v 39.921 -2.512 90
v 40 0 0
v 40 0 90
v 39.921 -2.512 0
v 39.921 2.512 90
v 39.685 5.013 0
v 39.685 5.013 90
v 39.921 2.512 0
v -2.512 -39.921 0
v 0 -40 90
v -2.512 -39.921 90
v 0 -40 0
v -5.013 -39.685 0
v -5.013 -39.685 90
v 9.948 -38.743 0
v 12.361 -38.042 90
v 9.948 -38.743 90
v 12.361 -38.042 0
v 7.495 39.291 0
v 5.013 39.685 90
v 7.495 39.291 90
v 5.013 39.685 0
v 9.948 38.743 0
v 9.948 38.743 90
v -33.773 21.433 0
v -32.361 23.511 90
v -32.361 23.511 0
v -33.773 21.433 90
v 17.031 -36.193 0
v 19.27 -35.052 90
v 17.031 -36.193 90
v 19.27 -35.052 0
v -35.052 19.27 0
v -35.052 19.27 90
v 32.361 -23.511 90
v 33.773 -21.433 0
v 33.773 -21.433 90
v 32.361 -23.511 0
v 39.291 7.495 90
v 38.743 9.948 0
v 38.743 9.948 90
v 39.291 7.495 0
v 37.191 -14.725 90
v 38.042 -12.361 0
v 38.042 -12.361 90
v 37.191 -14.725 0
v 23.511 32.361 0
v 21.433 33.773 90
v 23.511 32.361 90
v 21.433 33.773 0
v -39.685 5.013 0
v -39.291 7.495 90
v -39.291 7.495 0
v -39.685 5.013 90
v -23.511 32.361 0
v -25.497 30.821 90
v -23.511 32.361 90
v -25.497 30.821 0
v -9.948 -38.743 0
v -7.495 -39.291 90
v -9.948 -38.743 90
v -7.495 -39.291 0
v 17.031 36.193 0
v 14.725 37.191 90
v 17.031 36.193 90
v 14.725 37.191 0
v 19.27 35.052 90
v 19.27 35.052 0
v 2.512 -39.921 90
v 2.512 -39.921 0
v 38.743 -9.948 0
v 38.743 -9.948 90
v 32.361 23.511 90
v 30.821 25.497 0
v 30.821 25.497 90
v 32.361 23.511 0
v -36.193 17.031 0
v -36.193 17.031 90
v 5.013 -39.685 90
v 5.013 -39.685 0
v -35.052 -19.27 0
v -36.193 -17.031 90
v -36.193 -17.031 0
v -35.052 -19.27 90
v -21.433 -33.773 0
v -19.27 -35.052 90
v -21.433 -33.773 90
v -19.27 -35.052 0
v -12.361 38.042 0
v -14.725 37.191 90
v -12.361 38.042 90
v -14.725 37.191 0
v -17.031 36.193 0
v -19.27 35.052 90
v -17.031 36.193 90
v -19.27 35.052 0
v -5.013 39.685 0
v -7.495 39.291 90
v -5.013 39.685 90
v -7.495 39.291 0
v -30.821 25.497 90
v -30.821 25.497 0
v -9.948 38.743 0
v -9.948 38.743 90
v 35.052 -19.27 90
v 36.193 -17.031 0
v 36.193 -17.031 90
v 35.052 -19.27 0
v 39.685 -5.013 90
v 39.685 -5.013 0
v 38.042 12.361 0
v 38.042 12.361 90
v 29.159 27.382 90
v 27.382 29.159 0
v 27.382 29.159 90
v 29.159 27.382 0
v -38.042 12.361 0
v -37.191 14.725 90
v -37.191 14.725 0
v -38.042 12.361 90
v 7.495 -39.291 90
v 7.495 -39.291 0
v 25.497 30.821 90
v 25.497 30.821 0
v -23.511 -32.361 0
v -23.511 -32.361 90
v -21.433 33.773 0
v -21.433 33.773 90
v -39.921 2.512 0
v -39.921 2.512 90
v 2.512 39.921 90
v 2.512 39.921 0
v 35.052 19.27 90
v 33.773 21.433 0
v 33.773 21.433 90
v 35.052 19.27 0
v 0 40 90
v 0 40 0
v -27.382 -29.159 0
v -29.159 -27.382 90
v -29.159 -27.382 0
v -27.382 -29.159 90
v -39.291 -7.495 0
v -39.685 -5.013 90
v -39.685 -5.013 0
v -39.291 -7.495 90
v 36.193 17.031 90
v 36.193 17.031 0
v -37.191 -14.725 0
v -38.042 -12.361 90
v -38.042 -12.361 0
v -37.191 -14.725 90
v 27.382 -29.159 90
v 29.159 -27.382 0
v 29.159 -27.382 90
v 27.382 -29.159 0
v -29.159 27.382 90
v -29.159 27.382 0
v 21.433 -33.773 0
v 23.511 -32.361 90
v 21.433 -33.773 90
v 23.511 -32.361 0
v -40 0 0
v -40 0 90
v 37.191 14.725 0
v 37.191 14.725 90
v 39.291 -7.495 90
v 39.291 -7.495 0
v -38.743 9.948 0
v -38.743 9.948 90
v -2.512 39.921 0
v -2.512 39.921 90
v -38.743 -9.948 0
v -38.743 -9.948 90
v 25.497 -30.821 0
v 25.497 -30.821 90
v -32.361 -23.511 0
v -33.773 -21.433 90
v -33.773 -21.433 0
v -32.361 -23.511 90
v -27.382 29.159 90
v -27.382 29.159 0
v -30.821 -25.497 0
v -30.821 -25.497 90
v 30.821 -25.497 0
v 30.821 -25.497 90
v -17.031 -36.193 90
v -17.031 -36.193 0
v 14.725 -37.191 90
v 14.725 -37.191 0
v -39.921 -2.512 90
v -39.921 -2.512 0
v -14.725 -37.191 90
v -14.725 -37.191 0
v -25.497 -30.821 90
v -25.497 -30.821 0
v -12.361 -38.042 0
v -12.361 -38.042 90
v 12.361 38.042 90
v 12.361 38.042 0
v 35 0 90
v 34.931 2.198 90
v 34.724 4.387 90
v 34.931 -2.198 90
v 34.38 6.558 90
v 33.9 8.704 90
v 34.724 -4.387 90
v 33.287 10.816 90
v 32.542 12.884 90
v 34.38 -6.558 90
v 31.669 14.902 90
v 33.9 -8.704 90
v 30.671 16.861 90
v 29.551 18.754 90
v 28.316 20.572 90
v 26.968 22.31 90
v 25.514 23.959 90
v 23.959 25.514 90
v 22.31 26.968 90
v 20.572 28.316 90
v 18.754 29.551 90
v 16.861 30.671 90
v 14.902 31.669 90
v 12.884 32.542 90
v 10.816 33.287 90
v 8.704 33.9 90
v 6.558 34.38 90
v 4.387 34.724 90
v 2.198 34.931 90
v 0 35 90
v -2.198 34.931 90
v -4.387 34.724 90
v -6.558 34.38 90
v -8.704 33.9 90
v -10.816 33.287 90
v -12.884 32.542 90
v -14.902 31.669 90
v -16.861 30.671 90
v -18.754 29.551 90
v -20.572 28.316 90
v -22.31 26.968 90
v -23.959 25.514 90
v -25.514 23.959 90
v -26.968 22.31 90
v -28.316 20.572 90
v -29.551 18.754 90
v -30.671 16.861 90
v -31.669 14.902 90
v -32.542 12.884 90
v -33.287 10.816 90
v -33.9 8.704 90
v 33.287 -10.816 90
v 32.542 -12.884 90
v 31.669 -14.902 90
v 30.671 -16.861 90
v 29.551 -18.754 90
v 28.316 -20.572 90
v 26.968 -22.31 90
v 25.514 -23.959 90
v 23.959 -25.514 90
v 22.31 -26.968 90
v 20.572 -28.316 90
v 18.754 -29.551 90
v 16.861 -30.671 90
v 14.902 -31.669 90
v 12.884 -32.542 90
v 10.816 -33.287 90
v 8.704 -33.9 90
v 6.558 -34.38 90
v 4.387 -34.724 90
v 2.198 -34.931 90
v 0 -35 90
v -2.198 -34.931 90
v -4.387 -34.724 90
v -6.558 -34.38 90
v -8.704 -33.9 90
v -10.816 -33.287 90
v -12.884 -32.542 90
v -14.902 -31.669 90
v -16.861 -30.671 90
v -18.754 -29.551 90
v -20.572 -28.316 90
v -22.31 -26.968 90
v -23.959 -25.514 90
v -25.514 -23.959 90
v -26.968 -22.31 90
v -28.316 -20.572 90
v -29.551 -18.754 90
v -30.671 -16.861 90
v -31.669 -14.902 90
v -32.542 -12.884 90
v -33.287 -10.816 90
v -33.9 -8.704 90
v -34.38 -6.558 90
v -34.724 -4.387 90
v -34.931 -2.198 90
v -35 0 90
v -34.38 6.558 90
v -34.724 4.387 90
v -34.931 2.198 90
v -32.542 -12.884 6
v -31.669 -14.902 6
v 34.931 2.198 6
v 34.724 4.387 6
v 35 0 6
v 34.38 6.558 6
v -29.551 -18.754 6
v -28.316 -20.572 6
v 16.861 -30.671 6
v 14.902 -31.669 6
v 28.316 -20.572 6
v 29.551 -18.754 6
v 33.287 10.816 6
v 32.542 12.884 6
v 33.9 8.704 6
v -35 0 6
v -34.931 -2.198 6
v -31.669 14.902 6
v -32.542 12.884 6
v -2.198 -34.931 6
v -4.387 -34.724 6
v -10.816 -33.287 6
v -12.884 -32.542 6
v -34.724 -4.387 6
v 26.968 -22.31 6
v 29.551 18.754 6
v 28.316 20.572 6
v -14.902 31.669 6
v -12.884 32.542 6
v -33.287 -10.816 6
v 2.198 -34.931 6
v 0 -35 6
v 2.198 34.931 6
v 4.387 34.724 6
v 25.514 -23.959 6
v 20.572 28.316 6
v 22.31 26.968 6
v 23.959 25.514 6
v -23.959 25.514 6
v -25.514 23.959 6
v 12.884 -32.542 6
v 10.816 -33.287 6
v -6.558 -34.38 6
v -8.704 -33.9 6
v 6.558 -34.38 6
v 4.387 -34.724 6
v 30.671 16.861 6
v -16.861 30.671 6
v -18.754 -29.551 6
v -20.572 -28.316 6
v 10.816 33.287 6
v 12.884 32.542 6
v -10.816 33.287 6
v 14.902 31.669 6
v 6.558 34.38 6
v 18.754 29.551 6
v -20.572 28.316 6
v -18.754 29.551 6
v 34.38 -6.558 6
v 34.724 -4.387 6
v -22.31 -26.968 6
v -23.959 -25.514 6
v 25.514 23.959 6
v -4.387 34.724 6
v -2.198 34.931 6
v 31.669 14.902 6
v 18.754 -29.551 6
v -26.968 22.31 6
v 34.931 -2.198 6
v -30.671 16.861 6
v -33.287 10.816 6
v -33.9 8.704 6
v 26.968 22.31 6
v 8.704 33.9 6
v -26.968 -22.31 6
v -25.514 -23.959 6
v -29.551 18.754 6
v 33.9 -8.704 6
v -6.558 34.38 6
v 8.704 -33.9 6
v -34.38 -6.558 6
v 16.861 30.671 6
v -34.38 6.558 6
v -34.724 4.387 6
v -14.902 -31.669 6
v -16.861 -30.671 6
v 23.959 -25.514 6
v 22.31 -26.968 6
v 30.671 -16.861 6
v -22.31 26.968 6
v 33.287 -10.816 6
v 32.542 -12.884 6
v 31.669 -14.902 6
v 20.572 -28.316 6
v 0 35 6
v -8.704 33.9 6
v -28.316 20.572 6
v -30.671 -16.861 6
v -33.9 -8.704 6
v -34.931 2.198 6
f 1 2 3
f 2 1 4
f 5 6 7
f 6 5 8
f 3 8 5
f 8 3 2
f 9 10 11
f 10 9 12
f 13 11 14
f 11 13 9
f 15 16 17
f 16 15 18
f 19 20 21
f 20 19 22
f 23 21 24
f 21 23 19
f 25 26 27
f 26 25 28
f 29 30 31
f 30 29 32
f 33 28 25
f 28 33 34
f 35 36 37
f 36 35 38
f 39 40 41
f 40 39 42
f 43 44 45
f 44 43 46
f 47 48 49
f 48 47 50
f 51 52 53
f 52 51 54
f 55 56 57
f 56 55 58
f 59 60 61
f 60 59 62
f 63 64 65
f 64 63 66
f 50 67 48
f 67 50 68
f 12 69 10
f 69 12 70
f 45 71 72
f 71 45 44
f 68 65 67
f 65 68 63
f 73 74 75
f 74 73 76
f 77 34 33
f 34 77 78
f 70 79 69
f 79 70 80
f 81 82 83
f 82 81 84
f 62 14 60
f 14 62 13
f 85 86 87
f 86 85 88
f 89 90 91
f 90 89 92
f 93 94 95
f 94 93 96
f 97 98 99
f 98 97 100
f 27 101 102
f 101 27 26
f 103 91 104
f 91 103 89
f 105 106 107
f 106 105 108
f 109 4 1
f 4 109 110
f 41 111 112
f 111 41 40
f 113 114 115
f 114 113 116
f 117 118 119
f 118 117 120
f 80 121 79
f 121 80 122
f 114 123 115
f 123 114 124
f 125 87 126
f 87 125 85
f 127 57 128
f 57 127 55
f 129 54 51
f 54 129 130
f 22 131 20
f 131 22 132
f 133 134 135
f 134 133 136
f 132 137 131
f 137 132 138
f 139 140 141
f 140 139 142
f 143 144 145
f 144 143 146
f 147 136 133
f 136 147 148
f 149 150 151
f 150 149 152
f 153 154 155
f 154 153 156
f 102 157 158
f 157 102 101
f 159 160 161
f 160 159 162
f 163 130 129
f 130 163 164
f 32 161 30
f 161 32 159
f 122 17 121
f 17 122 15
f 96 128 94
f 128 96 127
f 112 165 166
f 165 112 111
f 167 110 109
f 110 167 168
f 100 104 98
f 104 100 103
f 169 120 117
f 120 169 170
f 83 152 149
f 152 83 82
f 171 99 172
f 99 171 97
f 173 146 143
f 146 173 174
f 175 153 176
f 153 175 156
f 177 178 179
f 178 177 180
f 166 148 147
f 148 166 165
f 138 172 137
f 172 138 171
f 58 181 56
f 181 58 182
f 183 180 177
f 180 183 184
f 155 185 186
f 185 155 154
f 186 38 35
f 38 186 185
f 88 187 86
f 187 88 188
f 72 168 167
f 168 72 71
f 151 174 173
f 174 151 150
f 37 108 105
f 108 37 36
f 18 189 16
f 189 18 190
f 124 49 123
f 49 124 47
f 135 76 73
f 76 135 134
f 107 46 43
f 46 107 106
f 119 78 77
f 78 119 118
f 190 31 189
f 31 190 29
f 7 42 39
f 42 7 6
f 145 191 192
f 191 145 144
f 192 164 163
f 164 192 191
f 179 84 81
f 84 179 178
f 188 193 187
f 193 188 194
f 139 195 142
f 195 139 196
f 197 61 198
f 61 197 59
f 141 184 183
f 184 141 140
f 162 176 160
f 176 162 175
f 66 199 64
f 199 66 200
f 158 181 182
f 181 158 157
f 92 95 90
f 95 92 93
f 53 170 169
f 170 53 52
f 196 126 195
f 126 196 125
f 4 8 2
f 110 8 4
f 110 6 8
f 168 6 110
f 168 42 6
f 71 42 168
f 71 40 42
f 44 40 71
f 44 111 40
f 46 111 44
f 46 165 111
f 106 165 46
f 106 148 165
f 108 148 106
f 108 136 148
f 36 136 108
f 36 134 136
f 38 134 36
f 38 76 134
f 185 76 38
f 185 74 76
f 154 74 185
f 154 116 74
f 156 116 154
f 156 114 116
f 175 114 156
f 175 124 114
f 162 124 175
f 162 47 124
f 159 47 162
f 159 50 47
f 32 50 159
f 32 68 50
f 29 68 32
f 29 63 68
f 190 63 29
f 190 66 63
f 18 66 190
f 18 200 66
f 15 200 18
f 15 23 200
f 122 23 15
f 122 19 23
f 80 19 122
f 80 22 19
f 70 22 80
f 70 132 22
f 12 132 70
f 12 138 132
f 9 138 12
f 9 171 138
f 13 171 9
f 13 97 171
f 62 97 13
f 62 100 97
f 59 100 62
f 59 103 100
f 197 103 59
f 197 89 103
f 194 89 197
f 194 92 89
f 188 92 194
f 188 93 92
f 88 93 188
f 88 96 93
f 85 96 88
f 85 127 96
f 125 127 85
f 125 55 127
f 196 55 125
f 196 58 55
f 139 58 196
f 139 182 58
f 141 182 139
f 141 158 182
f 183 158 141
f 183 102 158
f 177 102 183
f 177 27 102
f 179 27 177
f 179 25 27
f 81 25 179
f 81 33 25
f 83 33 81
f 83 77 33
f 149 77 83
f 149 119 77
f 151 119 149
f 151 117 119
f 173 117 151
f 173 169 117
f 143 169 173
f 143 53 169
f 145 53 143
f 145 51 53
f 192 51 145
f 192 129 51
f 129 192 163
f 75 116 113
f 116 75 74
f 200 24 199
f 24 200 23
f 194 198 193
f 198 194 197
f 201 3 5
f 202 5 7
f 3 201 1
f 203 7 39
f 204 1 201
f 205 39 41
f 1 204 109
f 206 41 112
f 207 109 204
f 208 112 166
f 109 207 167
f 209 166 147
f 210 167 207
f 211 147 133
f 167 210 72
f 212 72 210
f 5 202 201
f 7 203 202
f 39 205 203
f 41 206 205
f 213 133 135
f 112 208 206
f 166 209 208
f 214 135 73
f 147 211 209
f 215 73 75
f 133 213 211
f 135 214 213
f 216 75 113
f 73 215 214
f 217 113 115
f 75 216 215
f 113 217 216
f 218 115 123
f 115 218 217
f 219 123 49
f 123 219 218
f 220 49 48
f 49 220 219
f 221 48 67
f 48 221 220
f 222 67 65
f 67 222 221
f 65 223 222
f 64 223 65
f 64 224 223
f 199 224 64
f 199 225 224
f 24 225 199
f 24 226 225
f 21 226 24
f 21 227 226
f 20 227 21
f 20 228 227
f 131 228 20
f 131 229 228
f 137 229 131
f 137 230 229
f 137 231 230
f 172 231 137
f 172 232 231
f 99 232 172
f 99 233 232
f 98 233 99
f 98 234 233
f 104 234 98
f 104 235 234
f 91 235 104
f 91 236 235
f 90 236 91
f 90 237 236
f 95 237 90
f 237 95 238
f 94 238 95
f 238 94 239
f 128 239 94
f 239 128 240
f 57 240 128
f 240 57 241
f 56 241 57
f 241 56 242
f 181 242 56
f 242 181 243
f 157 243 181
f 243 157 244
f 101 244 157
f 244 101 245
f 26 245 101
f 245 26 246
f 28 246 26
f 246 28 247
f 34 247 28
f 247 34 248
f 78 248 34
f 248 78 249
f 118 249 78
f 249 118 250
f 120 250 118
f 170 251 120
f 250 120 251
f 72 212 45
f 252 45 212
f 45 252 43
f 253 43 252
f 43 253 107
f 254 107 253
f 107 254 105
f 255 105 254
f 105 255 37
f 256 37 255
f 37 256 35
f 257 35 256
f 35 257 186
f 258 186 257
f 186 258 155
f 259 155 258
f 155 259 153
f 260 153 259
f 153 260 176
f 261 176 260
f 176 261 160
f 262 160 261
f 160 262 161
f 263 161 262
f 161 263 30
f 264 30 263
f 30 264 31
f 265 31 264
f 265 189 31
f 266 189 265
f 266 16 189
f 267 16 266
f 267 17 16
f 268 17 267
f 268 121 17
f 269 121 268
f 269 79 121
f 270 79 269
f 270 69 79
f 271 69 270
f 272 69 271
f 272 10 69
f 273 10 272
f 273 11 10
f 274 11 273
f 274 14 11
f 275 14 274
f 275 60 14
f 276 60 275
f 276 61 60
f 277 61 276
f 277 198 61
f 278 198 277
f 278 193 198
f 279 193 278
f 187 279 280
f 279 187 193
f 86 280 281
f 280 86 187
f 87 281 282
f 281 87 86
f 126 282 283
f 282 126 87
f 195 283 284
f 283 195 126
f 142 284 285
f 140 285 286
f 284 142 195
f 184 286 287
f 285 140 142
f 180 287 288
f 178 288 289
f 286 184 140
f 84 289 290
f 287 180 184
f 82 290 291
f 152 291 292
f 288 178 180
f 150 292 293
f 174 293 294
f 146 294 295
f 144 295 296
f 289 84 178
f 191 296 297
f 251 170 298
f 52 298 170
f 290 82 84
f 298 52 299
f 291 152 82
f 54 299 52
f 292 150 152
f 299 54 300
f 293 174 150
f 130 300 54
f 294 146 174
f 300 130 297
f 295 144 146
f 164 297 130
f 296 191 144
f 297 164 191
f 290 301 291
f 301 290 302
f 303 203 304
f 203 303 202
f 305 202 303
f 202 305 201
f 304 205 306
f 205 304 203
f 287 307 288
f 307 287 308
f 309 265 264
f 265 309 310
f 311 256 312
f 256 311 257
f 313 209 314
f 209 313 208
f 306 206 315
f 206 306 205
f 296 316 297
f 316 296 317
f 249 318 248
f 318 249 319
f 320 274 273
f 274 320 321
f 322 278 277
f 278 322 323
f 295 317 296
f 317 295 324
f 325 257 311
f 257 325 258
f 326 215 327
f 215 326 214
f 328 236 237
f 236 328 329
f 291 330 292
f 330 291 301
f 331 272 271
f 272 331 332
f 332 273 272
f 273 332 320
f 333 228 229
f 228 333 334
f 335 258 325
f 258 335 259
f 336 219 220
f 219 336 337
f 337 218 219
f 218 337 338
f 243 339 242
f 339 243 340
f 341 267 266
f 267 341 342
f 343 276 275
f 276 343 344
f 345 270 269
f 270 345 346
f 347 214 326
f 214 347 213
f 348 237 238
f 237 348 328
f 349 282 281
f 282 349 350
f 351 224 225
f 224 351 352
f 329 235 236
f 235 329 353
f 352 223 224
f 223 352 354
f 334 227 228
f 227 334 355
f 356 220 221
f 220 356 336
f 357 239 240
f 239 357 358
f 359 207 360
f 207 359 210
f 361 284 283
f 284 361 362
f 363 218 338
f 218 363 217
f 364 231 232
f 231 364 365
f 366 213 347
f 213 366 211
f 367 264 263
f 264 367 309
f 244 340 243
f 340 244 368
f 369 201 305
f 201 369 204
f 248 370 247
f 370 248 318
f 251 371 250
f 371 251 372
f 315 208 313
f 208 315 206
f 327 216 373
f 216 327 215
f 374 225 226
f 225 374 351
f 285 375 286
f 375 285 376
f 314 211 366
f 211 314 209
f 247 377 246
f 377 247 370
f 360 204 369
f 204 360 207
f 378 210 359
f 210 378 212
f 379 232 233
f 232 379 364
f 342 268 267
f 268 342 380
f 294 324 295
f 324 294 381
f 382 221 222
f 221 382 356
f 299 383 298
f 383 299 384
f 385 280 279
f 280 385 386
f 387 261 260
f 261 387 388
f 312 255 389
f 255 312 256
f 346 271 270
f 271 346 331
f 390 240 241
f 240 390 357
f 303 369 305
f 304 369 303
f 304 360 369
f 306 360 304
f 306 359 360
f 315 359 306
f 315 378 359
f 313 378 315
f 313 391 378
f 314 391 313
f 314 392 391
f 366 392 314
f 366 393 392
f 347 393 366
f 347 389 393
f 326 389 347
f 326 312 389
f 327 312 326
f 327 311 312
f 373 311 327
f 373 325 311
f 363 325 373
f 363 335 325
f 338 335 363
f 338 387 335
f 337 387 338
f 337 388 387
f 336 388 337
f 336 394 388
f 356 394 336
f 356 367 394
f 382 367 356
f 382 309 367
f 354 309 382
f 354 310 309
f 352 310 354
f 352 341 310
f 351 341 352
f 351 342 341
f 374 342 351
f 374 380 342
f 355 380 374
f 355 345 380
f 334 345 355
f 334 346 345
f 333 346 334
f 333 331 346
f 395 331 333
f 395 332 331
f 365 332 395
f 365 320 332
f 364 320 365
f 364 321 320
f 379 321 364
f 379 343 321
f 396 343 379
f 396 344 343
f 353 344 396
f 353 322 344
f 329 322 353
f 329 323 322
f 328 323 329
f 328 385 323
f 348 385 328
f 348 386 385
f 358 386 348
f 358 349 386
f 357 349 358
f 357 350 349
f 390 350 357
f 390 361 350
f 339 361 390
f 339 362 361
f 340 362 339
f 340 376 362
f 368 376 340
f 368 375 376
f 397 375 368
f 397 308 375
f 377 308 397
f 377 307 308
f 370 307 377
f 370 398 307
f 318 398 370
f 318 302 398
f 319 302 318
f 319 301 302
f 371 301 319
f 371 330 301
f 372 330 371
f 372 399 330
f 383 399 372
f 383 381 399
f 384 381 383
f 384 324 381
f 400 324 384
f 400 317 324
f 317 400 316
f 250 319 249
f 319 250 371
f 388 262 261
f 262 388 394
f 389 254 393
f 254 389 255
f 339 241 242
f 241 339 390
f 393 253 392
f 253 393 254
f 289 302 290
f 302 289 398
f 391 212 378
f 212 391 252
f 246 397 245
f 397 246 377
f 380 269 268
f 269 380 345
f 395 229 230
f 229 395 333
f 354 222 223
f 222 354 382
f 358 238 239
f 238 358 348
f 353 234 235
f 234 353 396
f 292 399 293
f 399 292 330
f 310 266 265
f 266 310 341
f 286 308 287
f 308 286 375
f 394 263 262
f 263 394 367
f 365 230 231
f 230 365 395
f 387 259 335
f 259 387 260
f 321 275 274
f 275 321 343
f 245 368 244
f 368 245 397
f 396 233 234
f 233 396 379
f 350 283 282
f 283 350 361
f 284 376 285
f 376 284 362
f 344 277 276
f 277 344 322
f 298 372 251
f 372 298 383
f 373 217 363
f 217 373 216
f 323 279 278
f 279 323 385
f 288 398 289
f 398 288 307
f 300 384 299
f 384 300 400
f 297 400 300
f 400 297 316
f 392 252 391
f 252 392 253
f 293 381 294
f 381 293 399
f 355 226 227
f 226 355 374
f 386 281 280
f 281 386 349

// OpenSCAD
// Parameters
outer_diameter = 80;
inner_diameter = 70;
height = 90;
wall_thickness = (outer_diameter - inner_diameter) / 2;
bottom_thickness = 6;

handle_inner_height = 30;
handle_inner_width = 25;
handle_wall = 5;
handle_depth = 12;
handle_overlap = 1; // how much to embed into the mug wall
$fn = 100;

// Mug body
module mug_body() {
    difference() {
        cylinder(h = height, r = outer_diameter / 2);
        translate([0, 0, bottom_thickness])
            cylinder(h = height - bottom_thickness, r = inner_diameter / 2);
    }
}

// 2D D-shape for handle in the X (radial) and Y (vertical) plane, centered vertically
module handle_shape2d() {
    outer_h = handle_inner_height + 2 * handle_wall;
    outer_w = handle_inner_width + 2 * handle_wall;
    outer_r = outer_h / 2;
    inner_h = handle_inner_height;
    inner_w = handle_inner_width;
    inner_r = inner_h / 2;
    difference() {
        // Outer D shape
        union() {
            translate([0, -outer_h / 2])
                square([outer_w - outer_r, outer_h], center = false);
            translate([outer_w - outer_r, 0])
                circle(r = outer_r);
        }
        // Inner void
        union() {
            translate([0, -inner_h / 2])
                square([inner_w - inner_r, inner_h], center = false);
            translate([inner_w - inner_r, 0])
                circle(r = inner_r);
        }
    }
}

// Handle 3D
module handle() {
    translate([outer_diameter / 2 - handle_overlap, 0, height / 2])
        rotate([-90, 0, 0]) // orient so extrusion goes along global Y
            linear_extrude(height = handle_depth, center = true, convexity = 10)
                handle_shape2d();
}

// Assemble mug and handle
union() {
    mug_body();
    handle();
}
